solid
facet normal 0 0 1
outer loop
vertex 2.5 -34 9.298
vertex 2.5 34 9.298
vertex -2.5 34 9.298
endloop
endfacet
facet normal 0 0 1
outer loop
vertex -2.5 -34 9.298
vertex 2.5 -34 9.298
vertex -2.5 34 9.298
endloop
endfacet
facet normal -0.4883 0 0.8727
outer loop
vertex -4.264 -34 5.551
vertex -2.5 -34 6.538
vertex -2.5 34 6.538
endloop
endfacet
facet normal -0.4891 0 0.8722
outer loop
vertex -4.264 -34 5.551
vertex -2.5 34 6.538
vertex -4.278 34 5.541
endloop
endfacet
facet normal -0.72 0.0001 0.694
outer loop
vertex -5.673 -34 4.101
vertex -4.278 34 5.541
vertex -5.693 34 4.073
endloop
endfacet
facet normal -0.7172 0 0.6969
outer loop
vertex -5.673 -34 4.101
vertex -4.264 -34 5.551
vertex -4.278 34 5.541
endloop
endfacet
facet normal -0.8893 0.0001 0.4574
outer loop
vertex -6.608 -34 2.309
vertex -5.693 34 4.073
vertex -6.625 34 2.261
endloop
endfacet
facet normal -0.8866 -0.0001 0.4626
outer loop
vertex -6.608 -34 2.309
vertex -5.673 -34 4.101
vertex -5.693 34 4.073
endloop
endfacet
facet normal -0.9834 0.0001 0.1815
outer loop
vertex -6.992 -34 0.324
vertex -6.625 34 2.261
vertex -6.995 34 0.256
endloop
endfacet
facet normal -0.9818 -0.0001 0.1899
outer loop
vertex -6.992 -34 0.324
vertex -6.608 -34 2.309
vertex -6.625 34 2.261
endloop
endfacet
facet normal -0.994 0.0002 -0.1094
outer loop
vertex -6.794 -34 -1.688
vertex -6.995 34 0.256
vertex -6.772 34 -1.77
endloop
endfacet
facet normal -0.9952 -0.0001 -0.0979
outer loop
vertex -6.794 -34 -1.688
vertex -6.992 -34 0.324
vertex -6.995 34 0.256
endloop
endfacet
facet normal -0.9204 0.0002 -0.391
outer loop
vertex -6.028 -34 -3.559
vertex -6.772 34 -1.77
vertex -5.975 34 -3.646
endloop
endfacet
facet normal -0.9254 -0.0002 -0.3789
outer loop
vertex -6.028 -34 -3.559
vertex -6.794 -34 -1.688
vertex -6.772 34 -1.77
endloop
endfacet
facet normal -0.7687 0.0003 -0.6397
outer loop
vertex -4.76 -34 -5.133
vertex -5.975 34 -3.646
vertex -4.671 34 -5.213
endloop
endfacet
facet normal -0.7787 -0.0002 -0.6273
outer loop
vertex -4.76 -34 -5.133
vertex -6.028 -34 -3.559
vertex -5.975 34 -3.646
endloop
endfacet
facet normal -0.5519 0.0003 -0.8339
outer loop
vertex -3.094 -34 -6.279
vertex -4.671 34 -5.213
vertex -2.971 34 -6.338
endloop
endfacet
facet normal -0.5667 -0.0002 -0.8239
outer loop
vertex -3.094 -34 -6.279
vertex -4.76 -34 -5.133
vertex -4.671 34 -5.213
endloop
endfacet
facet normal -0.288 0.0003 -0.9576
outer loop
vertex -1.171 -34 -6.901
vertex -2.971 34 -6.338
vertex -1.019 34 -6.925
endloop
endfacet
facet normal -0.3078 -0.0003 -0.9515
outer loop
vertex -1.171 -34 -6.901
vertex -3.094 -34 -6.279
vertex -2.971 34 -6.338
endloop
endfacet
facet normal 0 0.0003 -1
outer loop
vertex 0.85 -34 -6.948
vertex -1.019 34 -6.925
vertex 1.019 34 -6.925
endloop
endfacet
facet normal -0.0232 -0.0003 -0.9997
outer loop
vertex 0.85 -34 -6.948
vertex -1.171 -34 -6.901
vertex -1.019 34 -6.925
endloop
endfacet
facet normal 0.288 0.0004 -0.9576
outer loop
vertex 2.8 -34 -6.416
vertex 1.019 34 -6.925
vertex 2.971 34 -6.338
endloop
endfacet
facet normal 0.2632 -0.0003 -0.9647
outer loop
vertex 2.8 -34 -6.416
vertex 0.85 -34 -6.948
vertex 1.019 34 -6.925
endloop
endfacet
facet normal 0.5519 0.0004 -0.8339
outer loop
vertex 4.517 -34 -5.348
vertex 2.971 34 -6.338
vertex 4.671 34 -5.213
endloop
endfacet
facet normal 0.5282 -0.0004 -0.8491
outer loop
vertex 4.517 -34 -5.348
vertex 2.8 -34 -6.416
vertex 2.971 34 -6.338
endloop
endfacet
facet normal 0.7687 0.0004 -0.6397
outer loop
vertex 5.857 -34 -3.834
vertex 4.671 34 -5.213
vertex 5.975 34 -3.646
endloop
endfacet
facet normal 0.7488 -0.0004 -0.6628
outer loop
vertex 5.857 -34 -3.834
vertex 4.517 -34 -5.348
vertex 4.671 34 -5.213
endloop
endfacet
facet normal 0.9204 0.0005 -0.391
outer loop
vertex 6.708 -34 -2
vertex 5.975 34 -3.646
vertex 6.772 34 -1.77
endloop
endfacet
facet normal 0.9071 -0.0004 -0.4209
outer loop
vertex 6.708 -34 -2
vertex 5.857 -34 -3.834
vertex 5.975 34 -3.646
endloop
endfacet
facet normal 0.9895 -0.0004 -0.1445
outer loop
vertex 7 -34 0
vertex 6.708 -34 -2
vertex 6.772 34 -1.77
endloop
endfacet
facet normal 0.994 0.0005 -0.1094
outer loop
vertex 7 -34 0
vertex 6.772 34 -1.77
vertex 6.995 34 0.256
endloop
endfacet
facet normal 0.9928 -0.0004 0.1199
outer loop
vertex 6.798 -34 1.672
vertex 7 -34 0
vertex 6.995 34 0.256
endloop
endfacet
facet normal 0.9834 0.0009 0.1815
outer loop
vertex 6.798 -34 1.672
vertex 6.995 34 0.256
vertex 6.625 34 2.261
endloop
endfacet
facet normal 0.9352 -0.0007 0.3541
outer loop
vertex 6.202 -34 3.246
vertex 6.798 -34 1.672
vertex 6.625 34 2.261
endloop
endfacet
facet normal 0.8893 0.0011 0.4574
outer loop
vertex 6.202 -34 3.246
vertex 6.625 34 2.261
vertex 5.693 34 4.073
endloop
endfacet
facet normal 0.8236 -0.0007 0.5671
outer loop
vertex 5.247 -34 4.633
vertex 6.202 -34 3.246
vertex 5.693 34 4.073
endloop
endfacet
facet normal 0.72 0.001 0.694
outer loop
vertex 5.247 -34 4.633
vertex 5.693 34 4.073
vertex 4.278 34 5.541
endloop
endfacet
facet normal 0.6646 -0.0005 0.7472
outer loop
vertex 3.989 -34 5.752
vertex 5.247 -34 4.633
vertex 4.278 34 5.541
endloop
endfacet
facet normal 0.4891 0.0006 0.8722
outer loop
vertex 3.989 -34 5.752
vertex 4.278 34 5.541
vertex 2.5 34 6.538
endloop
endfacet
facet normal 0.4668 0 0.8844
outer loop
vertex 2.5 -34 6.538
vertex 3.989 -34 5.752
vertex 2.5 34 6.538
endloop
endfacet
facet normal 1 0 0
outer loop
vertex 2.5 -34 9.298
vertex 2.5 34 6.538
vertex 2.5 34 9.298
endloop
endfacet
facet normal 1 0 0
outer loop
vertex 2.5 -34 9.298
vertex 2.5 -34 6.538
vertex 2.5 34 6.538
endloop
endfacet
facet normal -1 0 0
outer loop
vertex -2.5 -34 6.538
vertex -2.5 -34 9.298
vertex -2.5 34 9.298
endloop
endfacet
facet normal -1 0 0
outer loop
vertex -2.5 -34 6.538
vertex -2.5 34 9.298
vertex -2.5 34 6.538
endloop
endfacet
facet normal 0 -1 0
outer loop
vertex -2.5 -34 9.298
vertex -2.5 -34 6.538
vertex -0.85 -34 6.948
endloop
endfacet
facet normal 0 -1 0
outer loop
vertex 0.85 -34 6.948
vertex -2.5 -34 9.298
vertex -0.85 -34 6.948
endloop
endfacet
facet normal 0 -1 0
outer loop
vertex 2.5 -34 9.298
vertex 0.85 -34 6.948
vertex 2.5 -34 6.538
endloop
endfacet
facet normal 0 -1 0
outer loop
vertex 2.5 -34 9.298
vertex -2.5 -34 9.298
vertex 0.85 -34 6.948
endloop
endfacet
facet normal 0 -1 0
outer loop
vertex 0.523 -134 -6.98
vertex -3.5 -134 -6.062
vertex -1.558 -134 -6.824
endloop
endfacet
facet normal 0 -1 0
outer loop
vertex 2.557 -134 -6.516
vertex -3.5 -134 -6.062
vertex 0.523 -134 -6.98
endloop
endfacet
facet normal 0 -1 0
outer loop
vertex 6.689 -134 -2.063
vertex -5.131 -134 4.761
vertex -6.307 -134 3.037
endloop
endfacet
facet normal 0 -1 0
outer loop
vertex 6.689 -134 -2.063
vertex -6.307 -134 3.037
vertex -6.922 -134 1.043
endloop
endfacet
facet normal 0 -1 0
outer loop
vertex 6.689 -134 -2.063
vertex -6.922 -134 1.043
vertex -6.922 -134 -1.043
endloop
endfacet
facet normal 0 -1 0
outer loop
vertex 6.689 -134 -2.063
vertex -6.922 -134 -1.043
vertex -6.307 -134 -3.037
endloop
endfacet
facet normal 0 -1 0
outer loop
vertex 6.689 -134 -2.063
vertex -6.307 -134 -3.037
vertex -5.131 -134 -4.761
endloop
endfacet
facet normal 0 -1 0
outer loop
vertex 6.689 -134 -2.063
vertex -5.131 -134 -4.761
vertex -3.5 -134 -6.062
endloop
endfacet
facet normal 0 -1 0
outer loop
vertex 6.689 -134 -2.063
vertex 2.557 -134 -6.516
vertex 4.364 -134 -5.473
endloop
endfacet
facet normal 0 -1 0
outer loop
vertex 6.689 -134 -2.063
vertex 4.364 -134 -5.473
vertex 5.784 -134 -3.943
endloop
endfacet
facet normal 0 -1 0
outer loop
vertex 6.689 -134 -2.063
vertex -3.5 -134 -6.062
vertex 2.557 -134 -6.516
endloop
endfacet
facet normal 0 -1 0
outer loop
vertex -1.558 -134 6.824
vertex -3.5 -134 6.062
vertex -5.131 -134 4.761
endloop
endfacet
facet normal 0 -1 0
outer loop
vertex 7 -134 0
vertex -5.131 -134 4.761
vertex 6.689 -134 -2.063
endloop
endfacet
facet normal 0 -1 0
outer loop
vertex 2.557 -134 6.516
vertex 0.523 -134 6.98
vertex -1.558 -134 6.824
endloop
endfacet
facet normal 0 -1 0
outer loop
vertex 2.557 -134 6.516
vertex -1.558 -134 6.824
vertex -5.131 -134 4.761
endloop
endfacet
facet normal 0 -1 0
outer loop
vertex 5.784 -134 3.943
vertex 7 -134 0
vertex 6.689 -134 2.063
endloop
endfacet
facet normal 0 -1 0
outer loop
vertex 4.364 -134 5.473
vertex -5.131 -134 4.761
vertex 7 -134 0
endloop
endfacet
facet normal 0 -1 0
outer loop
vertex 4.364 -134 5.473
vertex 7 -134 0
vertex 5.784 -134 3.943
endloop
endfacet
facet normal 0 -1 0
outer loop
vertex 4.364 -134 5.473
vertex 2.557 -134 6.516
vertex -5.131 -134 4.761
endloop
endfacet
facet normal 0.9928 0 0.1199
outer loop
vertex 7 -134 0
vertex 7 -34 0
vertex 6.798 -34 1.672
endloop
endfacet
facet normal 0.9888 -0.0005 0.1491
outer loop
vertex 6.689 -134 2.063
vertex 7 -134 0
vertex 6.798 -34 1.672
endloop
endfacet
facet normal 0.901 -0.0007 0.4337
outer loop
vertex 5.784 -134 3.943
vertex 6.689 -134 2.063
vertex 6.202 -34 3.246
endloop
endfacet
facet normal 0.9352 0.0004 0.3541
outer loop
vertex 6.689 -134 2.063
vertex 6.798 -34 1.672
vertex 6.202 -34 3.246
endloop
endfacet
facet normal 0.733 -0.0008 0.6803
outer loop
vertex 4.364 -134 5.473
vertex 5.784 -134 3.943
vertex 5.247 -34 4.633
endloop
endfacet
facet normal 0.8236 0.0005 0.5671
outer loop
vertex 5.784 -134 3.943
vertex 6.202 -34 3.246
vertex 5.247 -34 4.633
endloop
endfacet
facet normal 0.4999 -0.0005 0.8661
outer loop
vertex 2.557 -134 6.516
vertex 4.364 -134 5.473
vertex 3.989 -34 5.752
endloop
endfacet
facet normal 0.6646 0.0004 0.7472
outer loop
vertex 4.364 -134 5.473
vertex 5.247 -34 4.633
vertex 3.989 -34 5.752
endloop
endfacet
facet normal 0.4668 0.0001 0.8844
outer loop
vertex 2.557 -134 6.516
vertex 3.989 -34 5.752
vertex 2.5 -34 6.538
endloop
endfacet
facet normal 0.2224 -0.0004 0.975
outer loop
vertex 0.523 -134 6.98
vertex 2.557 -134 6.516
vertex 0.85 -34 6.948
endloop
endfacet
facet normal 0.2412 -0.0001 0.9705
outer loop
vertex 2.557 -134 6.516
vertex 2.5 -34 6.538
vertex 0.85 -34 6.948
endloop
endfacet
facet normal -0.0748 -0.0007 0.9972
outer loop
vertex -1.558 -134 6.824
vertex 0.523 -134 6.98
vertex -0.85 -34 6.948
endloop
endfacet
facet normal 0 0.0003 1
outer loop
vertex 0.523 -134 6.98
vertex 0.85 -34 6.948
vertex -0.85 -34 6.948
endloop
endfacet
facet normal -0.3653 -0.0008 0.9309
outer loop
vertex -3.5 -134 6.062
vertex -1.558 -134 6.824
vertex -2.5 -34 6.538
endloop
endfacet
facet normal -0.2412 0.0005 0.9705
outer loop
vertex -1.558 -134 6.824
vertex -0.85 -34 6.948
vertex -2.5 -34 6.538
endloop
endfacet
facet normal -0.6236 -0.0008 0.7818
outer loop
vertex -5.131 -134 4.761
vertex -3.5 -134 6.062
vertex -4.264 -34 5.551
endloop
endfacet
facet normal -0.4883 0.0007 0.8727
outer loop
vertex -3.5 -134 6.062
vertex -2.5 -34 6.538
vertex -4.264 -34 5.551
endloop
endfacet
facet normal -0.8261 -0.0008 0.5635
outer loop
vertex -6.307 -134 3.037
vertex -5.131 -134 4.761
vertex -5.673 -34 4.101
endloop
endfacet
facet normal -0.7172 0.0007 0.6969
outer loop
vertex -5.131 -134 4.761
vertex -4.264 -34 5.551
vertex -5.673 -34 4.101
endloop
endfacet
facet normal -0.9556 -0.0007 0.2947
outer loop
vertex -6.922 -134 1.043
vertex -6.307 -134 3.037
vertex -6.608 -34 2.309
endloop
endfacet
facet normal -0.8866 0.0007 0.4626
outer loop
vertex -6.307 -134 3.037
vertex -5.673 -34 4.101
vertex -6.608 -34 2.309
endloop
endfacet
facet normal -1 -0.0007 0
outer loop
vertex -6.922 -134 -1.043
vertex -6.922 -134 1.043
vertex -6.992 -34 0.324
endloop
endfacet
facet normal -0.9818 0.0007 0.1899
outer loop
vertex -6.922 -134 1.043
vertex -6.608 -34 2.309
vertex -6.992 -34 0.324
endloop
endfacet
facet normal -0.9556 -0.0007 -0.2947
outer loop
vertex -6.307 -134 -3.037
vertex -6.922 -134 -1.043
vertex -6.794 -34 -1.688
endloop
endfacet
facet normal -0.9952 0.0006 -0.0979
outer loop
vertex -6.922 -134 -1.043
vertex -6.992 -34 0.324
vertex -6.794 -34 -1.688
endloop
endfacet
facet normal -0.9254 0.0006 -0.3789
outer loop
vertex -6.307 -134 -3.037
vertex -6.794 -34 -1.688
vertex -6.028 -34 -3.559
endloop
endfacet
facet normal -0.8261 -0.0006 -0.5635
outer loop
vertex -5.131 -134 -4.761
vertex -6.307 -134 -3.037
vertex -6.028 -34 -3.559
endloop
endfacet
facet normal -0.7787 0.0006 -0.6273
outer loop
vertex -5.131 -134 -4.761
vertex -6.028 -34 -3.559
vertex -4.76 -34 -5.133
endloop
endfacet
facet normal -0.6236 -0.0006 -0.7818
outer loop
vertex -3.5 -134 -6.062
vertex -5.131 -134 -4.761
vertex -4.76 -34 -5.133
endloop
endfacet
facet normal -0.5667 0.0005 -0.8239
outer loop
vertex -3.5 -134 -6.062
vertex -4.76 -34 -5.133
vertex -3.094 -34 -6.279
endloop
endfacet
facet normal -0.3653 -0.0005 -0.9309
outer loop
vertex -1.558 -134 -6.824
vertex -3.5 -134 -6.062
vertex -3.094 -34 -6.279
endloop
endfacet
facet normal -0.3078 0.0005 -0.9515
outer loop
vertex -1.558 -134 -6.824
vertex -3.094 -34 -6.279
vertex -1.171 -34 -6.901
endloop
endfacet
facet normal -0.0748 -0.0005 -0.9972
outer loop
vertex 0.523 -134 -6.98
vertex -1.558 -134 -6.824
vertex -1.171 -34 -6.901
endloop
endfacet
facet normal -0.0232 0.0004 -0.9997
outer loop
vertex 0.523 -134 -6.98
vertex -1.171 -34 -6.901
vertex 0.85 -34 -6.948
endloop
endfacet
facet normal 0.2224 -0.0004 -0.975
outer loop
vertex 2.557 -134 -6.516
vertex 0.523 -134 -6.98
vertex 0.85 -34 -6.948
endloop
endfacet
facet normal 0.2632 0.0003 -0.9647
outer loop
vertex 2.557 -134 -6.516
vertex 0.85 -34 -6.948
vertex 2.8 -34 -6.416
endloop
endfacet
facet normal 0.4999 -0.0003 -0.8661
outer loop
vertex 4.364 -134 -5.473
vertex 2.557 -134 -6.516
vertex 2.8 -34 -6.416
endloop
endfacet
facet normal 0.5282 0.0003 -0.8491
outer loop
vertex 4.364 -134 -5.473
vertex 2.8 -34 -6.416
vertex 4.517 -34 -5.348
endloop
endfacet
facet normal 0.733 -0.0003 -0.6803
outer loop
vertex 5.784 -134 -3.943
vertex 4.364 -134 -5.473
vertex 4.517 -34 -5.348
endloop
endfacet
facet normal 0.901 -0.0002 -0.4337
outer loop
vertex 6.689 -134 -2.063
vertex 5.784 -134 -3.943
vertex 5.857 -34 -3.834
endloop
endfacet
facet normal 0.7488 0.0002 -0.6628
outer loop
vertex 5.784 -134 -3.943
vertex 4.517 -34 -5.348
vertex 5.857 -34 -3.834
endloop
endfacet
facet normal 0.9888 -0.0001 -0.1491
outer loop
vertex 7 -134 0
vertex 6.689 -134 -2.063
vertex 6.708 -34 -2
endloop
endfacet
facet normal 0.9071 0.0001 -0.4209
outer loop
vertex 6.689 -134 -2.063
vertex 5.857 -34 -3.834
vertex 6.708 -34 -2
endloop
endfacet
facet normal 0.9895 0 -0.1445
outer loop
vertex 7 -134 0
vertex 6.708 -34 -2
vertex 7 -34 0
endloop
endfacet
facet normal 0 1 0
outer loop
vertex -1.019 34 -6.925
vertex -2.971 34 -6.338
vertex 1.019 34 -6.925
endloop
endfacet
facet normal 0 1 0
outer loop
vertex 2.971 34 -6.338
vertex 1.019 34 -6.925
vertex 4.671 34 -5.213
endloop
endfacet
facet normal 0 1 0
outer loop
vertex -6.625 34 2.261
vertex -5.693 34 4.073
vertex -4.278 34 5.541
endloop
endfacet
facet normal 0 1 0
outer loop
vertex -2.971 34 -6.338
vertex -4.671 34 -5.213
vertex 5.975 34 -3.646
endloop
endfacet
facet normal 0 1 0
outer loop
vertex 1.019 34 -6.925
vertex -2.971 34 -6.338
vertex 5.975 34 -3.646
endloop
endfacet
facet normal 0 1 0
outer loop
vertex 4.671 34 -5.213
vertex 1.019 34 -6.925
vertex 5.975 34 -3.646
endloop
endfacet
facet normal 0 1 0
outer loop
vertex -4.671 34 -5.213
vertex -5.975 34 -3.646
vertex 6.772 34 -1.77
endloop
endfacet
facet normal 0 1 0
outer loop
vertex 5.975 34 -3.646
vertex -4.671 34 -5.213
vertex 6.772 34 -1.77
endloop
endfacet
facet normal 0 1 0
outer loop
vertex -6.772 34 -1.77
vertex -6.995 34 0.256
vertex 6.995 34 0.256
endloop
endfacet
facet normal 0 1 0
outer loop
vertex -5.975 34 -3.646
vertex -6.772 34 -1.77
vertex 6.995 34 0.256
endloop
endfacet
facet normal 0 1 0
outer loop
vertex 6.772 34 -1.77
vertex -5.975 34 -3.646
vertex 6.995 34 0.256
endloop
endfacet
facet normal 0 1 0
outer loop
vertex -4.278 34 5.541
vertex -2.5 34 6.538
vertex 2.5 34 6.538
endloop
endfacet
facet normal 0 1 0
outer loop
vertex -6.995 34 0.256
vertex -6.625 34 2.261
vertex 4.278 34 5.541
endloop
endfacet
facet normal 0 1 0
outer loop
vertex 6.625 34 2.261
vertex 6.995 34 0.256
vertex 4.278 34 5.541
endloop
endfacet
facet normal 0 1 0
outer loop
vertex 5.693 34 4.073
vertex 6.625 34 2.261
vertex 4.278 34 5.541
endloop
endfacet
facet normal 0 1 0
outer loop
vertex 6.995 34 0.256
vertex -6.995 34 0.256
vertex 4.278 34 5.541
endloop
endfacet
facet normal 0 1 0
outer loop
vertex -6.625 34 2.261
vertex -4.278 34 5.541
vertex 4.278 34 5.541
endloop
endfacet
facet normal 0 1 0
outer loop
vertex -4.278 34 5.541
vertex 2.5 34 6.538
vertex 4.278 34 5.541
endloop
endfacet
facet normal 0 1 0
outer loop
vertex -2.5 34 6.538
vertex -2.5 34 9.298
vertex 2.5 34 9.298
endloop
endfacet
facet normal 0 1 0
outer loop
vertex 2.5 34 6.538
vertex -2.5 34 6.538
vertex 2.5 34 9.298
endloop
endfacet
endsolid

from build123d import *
from build123d import SkipClean  # not in build123d's __all__

# Parameters (mm, degrees)
F1_DEPTH = 34
F2_R     = 7
F4_DEPTH = 100


with BuildPart() as f1:
    # F0 (on Front) → F1 (new body, symmetric)
    with BuildSketch(Plane.XZ):
        with BuildLine():
            Line((2.5, 9.2983484153), (-2.5, 9.2983484153))
            Line((-2.5, 9.2983484153), (-2.5, 6.5383484153))
            ThreePointArc((-2.5, 6.5383484153), (0, -7), (2.5, 6.5383484153))
            Line((2.5, 6.5383484153), (2.5, 9.2983484153))
        make_face()
    extrude(amount=F1_DEPTH, both=True)

    # F2 (on face) → F4 (join)
    with BuildSketch(Plane.XZ.offset(34)):
        Circle(F2_R)
    with SkipClean():  # cleaning this boolean's faces spoils the solid; the shape is the same uncleaned
        extrude(amount=F4_DEPTH)


solid = f1.part
